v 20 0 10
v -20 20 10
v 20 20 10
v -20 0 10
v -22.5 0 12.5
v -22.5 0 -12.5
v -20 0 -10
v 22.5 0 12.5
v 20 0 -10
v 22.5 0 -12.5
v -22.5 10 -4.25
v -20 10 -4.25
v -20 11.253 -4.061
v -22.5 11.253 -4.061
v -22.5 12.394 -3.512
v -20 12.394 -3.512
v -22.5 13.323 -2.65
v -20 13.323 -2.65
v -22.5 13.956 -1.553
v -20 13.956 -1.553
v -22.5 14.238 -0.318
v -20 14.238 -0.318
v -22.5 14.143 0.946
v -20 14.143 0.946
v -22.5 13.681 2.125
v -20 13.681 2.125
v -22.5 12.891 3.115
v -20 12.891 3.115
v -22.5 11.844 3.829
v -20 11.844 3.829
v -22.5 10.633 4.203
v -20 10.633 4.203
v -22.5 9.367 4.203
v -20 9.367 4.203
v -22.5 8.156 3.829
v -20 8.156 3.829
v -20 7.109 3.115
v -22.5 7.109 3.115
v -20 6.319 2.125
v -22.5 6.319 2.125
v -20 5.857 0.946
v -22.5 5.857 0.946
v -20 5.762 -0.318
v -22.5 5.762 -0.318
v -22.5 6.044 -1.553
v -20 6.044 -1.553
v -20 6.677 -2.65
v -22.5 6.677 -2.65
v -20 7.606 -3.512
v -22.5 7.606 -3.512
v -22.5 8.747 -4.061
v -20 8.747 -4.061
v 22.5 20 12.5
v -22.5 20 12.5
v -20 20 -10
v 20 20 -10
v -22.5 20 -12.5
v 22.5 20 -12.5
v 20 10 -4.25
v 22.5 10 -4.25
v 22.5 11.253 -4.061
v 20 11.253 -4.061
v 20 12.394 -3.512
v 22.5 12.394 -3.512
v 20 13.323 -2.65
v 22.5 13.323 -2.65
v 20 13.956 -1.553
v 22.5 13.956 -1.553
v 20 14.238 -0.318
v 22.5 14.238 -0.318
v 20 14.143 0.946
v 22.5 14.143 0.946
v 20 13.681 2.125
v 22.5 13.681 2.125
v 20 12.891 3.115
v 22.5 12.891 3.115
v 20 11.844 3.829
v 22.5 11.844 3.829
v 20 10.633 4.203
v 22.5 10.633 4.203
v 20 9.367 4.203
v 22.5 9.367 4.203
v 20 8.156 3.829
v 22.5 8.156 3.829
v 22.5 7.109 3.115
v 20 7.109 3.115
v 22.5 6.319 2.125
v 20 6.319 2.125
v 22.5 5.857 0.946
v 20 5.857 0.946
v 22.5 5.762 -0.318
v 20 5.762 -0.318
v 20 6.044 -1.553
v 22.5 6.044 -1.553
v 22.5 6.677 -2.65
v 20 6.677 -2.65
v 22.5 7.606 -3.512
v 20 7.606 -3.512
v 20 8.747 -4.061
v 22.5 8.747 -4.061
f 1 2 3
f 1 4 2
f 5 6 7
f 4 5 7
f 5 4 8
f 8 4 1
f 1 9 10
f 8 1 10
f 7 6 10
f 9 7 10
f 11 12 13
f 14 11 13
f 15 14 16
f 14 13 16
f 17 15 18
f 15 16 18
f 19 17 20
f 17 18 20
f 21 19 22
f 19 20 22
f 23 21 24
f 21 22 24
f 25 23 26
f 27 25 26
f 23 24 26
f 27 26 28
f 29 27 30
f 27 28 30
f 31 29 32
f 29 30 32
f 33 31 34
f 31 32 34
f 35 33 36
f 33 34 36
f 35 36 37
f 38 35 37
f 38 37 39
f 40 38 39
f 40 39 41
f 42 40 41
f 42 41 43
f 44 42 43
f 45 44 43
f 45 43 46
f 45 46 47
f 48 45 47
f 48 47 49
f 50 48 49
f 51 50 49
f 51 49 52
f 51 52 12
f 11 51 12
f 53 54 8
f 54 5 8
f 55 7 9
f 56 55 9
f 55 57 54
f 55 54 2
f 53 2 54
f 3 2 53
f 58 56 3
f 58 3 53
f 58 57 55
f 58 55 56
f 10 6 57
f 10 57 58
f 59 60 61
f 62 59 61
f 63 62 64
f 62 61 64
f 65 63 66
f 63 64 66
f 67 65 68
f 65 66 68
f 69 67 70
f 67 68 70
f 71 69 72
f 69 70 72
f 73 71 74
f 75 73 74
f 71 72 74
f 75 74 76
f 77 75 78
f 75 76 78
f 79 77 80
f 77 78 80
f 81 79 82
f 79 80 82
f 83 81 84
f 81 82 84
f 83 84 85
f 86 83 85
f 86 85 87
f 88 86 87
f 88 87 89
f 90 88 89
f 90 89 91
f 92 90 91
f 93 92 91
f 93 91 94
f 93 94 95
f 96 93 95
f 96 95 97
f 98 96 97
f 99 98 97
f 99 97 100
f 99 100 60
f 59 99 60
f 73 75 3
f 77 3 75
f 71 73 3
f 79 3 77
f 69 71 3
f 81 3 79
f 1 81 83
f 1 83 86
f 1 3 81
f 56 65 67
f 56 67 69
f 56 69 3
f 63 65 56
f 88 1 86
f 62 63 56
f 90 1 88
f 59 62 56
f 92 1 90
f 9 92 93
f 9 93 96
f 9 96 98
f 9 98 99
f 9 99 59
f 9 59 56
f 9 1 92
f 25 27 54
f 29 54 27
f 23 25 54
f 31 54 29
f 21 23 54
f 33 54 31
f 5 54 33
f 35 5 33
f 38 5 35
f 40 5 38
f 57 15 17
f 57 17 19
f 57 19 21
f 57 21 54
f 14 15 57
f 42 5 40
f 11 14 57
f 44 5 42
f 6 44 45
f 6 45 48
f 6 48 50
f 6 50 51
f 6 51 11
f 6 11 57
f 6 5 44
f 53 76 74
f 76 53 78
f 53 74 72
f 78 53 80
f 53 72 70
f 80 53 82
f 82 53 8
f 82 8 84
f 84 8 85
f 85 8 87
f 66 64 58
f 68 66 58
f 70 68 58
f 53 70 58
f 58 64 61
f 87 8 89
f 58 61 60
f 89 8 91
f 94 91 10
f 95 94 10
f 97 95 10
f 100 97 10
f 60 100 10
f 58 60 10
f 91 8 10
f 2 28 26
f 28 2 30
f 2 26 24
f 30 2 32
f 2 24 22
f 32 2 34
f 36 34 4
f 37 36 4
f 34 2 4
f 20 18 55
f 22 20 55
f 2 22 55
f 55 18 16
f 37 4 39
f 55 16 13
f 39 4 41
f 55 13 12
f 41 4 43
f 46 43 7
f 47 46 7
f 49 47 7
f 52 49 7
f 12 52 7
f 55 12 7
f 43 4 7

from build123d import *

# Parameters (mm, degrees)
SKETCH1_W           = 45
SKETCH1_H           = 25
SKETCH1_W_2         = 40
SKETCH1_H_2         = 20
BOSS_EXTRUDE1_DEPTH = 2.5
SKETCH2_W           = 45
SKETCH2_H           = 25
SKETCH2_W_2         = 40
SKETCH2_H_2         = 20
BOSS_EXTRUDE2_DEPTH = 17.5
SKETCH3_R           = 4.25
CUT_EXTRUDE1_DEPTH  = 46


with BuildPart() as part:
    # Sketch1 → Boss-Extrude1 (new body)
    with BuildSketch(Plane(origin=(0, 0, 0), x_dir=(1, 0, 0), z_dir=(0, 1, 0))):
        Rectangle(SKETCH1_W, SKETCH1_H)
        Rectangle(SKETCH1_W_2, SKETCH1_H_2, mode=Mode.SUBTRACT)
    extrude(amount=BOSS_EXTRUDE1_DEPTH)

    # Sketch2 → Boss-Extrude2 (add)
    with BuildSketch(Plane(origin=(0, 2.5, 0), x_dir=(1, 0, 0), z_dir=(0, 1, 0))):
        Rectangle(SKETCH2_W, SKETCH2_H)
        Rectangle(SKETCH2_W_2, SKETCH2_H_2, mode=Mode.SUBTRACT)
    extrude(amount=BOSS_EXTRUDE2_DEPTH)

    # Sketch3 → Cut-Extrude1 (cut, through all)
    with BuildSketch(Plane(origin=(22.5, 0, 0), x_dir=(0, 0, -1), z_dir=(1, 0, 0))):
        with Locations((0, 10)):
            Circle(SKETCH3_R)
    extrude(amount=-CUT_EXTRUDE1_DEPTH, mode=Mode.SUBTRACT)


solid = part.part
